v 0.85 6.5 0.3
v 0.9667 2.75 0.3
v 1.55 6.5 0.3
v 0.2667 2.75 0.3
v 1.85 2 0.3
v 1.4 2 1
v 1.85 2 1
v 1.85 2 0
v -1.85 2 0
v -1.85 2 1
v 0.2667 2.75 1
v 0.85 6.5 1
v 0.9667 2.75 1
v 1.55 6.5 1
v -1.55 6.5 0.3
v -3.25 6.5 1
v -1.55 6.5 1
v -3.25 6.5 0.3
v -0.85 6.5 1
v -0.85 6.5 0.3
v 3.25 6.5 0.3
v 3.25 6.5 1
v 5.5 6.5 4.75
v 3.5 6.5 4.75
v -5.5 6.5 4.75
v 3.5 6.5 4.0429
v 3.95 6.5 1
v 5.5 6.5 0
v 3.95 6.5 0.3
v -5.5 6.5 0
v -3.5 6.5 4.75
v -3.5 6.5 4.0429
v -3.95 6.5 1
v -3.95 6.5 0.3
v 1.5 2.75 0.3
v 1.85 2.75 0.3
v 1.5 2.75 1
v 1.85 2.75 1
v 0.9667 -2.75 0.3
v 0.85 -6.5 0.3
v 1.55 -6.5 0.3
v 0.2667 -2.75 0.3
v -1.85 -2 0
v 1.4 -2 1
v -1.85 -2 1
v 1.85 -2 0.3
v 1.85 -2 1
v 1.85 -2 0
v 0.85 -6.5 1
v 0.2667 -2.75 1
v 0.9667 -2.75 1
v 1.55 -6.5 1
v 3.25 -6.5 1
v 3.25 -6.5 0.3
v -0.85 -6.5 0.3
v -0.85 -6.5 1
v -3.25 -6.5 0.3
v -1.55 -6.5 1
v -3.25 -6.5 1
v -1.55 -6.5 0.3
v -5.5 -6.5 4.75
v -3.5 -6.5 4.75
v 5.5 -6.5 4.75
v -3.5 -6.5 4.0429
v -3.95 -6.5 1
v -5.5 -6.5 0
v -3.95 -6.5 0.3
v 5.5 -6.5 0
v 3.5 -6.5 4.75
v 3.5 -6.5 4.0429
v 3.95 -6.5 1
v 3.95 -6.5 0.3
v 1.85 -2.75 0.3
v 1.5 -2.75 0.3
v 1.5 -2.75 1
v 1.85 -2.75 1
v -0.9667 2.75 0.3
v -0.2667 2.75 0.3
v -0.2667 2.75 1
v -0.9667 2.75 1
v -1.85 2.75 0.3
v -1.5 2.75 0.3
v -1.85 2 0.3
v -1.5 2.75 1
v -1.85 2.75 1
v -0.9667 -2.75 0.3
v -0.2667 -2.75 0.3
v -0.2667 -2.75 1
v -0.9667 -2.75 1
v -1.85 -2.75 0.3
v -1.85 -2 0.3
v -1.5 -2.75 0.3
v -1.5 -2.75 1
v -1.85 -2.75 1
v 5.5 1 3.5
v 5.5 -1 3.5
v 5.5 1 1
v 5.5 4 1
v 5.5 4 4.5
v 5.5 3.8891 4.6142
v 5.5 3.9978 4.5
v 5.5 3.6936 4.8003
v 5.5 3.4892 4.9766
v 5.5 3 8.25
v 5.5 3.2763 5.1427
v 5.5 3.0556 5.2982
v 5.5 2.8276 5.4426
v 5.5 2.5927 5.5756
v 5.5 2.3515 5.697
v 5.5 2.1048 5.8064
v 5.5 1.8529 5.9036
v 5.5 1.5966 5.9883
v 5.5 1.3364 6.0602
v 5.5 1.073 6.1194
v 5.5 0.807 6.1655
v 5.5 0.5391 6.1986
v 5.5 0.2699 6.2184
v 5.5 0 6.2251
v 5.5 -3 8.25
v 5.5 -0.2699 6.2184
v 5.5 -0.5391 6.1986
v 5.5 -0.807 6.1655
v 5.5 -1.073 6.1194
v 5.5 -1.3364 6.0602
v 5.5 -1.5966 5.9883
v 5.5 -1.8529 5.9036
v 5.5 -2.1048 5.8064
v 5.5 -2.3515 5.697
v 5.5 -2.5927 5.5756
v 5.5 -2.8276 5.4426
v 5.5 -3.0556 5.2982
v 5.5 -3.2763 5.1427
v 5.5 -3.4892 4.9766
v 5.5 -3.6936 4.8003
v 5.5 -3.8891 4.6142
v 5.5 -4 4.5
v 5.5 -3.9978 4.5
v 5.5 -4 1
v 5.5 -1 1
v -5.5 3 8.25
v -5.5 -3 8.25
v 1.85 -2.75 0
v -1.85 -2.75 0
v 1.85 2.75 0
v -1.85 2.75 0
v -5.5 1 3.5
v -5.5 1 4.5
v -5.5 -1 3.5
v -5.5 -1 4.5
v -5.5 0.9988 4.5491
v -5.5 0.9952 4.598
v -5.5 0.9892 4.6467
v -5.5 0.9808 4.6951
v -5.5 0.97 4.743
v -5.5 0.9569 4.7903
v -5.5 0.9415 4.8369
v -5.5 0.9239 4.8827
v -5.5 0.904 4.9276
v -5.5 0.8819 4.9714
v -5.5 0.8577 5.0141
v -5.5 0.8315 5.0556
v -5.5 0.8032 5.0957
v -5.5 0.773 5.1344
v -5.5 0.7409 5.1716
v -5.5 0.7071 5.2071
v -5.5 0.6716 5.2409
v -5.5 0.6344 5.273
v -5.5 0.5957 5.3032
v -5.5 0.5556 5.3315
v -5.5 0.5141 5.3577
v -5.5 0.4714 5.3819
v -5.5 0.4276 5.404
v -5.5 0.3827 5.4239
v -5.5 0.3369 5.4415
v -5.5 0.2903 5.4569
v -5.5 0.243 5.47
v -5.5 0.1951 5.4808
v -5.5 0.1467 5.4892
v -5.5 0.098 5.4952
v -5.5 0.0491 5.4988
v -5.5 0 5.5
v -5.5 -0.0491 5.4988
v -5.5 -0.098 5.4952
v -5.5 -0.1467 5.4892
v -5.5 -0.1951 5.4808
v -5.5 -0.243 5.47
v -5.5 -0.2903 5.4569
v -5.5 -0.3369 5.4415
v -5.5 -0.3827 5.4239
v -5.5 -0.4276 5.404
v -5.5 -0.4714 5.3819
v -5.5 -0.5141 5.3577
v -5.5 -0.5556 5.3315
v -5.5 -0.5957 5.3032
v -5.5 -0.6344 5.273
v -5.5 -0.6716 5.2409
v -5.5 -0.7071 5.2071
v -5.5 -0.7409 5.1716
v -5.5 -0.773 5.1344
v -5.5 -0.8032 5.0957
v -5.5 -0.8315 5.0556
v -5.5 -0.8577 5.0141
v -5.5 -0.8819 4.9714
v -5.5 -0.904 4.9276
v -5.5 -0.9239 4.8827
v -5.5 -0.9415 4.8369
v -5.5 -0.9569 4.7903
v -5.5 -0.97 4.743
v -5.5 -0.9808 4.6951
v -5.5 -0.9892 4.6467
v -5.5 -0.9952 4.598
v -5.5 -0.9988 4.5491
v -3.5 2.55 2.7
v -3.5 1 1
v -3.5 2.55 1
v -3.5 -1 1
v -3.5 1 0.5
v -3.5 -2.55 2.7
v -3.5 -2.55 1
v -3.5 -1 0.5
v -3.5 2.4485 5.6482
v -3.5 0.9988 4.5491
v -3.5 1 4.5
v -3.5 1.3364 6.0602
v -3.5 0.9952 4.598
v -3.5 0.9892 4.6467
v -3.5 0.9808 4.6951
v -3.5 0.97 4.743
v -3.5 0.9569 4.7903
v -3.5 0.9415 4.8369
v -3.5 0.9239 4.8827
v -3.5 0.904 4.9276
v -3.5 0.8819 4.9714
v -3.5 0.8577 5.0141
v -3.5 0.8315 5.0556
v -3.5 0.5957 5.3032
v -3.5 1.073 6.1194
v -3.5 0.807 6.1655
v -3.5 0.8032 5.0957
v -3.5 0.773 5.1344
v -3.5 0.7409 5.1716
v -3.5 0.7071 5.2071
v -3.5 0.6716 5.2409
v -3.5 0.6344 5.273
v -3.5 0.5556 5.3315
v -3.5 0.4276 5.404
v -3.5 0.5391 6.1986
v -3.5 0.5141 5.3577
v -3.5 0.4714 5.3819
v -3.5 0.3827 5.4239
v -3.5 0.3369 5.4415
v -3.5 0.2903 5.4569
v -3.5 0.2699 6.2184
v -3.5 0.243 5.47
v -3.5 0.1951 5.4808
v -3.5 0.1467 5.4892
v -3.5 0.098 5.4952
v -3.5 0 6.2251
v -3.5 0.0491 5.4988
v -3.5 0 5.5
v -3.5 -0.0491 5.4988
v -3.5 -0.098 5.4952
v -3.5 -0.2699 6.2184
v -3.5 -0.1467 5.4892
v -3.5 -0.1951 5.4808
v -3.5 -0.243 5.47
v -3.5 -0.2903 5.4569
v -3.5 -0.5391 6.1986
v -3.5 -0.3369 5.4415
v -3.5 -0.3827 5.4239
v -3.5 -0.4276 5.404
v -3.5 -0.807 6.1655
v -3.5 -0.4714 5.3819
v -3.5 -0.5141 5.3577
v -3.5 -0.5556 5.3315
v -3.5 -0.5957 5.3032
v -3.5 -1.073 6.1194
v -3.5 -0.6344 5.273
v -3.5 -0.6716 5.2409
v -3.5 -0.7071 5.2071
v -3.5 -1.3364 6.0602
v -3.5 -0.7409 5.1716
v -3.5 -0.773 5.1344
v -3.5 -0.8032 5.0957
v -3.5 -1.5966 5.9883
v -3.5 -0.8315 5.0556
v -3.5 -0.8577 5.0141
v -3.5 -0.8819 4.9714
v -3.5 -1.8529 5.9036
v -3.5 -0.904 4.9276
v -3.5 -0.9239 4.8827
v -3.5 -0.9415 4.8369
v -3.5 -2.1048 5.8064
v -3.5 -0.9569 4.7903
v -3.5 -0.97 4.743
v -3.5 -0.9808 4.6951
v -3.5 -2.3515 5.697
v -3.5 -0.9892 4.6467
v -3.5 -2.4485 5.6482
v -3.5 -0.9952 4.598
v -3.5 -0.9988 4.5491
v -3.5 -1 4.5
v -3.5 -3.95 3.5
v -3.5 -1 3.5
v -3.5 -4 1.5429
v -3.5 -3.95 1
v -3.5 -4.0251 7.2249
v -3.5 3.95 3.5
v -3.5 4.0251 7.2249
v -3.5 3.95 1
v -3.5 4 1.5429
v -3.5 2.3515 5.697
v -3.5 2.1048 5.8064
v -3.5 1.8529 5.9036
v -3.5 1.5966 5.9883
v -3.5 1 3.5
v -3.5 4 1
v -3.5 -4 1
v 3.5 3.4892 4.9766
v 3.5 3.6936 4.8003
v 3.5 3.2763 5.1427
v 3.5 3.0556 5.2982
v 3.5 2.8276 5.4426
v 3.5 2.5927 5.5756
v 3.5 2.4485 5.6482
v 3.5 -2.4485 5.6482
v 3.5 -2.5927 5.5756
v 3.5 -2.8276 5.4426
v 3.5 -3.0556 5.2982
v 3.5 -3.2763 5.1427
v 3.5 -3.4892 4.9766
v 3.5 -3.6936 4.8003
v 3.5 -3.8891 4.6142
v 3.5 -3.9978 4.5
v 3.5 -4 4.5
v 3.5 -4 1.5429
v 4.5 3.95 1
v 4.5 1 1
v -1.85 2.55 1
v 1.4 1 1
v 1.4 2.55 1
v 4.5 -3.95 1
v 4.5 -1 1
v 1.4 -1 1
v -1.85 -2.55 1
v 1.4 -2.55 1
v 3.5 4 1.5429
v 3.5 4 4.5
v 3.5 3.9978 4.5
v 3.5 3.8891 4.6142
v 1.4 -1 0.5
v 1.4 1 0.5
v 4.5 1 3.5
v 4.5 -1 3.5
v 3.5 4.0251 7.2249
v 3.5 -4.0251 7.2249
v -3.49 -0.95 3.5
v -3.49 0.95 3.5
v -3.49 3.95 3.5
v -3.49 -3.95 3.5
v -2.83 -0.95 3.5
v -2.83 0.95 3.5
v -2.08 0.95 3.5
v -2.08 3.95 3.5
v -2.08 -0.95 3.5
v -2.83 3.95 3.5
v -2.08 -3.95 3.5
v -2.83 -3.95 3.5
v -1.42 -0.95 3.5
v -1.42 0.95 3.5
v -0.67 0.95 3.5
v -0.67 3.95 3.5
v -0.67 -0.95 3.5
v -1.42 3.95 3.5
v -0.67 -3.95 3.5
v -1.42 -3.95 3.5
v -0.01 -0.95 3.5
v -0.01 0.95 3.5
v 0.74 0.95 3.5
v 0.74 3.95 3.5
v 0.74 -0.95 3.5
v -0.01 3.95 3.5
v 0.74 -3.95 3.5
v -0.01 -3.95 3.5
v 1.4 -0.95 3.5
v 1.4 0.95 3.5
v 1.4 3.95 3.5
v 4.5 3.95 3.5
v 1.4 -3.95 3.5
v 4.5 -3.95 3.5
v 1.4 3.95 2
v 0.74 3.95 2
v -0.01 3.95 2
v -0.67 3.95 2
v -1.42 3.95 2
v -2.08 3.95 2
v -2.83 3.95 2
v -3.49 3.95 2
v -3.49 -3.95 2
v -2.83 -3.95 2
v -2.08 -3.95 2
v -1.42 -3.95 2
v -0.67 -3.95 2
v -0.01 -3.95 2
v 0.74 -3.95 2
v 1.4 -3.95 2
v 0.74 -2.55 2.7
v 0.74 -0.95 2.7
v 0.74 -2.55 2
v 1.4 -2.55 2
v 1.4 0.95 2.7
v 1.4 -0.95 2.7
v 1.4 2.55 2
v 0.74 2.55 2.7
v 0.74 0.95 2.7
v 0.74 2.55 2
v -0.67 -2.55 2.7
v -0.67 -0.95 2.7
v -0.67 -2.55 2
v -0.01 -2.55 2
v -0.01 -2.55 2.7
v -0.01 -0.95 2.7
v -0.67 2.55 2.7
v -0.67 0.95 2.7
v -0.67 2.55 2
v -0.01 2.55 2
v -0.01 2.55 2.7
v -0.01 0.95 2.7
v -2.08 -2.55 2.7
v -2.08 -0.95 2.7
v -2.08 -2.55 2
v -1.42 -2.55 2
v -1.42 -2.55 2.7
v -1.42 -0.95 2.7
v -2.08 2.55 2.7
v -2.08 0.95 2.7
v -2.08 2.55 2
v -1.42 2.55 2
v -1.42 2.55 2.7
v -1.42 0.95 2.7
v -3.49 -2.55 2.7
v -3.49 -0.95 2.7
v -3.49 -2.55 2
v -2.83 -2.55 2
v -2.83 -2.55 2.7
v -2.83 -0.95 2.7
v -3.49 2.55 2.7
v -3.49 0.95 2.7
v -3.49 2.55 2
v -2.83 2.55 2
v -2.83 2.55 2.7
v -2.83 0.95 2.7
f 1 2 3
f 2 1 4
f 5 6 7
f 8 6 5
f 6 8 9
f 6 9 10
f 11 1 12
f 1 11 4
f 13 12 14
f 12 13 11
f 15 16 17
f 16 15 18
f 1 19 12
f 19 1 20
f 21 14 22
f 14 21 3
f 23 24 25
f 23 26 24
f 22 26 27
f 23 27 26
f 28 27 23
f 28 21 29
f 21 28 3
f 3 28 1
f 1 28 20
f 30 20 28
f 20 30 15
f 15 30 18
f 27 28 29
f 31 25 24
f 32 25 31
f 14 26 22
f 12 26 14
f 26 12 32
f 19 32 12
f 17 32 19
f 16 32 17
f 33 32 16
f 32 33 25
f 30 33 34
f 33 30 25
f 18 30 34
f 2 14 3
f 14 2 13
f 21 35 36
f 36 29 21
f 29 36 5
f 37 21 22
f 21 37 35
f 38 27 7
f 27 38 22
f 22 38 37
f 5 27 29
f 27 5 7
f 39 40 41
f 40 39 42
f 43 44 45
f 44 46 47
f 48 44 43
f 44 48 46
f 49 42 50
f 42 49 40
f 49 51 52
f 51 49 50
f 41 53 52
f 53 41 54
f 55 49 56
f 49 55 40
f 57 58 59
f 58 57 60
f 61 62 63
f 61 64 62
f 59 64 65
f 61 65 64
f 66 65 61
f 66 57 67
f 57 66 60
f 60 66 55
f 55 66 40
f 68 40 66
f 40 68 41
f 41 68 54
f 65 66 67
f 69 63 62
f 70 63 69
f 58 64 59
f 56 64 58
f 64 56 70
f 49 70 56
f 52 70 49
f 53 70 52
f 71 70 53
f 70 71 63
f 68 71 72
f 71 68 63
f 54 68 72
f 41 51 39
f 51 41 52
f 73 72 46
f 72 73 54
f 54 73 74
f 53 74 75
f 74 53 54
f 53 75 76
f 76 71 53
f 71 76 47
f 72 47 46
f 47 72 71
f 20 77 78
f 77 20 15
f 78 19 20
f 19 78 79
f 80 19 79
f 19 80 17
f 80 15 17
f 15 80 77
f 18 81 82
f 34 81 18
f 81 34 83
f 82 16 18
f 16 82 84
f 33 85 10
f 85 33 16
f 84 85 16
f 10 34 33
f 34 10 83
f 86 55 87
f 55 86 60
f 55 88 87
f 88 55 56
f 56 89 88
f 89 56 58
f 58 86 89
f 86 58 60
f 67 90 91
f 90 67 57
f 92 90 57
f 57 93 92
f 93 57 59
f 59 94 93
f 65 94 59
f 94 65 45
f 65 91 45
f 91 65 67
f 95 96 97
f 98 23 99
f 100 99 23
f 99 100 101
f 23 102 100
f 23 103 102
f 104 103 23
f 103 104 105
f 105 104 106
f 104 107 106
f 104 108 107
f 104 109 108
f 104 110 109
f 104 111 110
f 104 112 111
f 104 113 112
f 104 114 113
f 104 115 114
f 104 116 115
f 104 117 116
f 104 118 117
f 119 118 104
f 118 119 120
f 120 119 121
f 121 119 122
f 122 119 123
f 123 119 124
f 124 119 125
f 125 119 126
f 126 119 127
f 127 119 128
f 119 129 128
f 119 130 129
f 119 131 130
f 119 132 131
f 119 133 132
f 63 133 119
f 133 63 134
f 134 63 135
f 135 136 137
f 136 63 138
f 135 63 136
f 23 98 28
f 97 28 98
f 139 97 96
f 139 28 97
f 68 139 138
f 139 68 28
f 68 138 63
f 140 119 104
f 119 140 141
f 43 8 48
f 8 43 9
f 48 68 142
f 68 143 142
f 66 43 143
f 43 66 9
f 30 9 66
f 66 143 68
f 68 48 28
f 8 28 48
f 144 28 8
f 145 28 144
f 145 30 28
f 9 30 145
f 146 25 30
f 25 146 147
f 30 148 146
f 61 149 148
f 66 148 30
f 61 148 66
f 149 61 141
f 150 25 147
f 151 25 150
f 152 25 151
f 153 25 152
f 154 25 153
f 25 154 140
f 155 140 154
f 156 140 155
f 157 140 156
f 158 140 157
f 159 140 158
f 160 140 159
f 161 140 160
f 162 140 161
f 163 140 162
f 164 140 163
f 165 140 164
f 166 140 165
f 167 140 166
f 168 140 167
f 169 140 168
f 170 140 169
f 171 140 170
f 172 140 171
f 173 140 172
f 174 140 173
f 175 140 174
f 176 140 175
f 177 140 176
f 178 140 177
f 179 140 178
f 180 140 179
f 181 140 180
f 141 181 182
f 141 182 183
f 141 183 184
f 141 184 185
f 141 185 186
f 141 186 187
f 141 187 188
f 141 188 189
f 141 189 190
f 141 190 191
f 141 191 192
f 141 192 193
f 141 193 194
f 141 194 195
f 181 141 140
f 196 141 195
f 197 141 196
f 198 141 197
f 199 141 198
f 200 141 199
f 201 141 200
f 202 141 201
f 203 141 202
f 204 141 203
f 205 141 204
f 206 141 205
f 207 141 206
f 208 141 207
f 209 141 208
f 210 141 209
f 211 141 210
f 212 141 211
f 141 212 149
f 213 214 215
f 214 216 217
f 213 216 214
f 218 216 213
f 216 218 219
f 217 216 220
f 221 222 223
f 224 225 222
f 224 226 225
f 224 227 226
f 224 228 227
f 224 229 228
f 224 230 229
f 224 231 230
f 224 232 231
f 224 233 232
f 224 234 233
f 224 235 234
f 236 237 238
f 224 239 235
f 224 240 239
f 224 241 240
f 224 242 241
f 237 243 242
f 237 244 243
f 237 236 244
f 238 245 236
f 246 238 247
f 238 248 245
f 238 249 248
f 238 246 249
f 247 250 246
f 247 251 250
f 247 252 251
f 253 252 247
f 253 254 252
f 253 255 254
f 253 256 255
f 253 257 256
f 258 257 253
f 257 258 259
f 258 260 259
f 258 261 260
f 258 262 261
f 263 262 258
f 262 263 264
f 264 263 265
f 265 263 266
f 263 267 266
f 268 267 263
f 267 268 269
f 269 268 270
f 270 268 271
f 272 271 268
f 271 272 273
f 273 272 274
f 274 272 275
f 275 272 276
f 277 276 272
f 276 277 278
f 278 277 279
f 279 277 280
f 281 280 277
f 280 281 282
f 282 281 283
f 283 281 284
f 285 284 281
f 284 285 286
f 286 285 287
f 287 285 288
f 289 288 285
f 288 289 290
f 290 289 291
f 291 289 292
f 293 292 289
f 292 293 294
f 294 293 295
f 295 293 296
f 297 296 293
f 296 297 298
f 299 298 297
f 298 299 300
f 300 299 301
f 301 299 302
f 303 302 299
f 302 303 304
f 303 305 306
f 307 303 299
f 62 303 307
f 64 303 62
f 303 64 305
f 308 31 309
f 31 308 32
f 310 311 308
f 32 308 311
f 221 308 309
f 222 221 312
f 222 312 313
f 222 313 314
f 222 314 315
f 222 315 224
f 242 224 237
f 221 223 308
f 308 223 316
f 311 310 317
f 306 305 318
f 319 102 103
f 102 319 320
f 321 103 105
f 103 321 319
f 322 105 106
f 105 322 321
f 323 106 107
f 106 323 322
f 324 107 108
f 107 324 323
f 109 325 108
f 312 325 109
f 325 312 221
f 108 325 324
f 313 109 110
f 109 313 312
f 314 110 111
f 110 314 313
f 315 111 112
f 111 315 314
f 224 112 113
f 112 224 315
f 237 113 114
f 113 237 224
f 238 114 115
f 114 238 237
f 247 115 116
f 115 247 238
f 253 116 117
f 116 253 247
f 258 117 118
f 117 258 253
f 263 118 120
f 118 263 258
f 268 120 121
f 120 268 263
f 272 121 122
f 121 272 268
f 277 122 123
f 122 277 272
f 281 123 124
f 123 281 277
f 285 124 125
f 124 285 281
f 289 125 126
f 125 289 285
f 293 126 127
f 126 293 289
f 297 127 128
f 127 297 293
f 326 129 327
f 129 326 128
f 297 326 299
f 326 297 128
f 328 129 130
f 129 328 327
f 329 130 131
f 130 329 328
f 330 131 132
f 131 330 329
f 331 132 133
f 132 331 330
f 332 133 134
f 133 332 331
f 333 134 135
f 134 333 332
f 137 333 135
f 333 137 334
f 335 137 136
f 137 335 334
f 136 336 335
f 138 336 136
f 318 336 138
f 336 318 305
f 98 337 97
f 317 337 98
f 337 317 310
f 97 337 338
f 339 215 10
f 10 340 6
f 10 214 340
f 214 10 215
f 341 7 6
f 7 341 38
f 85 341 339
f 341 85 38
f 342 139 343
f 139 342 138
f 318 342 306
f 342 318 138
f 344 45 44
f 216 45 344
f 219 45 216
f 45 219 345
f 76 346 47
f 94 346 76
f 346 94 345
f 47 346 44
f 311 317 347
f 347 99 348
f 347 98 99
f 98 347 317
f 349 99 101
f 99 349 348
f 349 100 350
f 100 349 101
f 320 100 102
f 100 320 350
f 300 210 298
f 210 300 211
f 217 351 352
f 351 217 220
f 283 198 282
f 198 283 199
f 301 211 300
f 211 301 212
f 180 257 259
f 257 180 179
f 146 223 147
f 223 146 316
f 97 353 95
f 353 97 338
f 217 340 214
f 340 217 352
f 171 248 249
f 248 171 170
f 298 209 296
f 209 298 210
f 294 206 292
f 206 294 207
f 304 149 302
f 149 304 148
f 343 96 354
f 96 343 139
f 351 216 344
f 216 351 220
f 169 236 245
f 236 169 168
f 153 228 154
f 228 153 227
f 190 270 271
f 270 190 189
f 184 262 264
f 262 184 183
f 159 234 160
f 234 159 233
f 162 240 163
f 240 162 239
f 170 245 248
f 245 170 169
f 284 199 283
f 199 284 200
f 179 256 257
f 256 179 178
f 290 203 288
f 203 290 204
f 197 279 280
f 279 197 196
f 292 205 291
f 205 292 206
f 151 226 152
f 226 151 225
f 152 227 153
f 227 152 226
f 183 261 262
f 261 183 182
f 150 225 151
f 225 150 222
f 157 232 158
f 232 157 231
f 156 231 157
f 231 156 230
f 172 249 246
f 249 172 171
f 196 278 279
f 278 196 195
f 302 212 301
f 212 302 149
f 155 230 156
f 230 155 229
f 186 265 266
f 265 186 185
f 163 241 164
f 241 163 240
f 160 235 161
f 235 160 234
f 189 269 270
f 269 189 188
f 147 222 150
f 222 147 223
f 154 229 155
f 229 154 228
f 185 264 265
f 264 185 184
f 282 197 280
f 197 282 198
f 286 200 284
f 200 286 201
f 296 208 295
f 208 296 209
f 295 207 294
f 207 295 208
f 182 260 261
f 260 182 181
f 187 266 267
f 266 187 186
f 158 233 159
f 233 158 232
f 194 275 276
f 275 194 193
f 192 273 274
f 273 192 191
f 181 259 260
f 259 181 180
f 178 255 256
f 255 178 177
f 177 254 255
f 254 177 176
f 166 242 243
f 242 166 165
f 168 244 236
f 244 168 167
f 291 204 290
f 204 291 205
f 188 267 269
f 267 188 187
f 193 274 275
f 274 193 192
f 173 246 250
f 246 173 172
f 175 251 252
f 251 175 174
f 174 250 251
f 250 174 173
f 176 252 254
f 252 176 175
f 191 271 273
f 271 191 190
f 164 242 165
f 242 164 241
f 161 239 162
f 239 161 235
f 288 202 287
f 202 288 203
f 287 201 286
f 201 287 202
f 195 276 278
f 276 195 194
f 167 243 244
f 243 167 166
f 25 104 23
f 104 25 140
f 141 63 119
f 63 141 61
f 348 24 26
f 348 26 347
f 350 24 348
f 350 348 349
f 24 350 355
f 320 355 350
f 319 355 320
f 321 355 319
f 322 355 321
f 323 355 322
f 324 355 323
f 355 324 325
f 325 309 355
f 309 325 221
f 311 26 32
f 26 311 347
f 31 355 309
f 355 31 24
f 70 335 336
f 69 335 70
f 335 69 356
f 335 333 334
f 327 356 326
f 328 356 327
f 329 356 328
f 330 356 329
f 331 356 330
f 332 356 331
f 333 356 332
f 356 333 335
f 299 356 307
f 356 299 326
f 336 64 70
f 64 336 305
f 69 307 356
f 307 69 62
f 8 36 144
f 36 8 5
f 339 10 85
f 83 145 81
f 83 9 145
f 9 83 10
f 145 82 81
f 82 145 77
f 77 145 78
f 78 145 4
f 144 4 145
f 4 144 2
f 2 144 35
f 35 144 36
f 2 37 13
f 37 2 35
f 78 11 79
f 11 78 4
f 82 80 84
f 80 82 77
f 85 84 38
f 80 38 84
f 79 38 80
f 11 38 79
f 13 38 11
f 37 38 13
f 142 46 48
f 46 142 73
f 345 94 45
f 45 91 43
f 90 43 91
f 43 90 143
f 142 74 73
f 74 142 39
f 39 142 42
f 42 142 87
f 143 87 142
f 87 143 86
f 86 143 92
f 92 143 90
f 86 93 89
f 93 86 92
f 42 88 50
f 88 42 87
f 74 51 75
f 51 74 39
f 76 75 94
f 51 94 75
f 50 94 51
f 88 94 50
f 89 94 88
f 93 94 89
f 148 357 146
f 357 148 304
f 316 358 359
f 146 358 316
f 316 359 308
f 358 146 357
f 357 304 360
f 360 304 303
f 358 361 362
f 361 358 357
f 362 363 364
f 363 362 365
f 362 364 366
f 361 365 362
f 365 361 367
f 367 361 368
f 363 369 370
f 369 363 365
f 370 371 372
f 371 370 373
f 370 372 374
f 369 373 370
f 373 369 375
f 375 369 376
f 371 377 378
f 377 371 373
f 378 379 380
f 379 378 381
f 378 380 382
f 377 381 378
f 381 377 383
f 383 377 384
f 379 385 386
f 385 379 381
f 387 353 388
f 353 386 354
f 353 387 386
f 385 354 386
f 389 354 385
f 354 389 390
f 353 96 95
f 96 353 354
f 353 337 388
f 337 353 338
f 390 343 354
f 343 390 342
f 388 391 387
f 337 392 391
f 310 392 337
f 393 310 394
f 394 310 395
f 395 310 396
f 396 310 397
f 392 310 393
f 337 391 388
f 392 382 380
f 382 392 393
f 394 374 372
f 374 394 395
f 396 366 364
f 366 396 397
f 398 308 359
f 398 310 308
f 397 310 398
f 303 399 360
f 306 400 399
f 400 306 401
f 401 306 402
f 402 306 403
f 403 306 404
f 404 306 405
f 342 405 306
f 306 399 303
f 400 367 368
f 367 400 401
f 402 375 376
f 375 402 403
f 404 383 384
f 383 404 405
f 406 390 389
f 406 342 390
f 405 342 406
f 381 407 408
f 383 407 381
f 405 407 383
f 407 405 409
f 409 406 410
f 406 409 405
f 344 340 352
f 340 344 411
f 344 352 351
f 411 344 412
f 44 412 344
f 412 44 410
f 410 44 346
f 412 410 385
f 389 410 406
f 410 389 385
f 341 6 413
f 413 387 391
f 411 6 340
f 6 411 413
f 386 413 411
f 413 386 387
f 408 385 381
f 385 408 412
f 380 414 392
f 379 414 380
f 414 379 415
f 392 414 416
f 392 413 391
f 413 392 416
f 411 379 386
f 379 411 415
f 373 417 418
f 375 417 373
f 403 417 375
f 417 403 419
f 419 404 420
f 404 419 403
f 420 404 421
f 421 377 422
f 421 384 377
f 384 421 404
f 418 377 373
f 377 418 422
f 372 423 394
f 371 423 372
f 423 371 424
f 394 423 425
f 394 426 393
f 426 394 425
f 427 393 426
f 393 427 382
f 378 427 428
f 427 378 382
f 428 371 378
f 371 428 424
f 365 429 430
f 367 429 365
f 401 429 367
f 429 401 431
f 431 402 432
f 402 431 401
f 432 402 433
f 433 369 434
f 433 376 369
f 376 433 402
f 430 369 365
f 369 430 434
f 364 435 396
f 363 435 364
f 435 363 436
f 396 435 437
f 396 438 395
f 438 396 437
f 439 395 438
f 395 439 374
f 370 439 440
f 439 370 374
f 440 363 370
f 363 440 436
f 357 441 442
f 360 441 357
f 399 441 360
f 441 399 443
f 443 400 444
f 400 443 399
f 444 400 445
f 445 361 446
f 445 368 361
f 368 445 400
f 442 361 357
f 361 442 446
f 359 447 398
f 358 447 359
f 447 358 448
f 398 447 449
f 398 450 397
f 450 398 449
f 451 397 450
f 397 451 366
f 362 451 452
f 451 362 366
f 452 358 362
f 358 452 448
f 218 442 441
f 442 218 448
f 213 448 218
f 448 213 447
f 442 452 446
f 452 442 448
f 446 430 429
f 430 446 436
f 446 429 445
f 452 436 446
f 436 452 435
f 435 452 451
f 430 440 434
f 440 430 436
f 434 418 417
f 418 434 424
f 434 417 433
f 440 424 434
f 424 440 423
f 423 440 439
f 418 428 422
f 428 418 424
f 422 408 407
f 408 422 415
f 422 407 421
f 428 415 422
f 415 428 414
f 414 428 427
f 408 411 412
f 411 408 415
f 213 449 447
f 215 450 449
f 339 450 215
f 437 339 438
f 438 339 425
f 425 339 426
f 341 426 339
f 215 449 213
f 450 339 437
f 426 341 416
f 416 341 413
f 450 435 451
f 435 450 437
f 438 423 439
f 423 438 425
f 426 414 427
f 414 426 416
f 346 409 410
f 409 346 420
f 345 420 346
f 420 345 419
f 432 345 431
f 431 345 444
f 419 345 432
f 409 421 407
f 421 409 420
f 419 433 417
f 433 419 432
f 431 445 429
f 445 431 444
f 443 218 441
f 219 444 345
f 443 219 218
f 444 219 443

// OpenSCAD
/**
 * @file ambb_v2.scad
 * @brief This file contains the code for an improved AMBB (Additive Manufacture Breakout Board).
 * @author Cameron K. Brooks
 * @details The AMBB is a project that aims to create a 3D printable enclosure to demonstrate the concept
 *          of a breakout board that's 3D printable. It works by enforcing contact between an SMT (in this
 *          study, an 8-SOIC form) and header pins to create a through-hole component that's compatible with
 *          a breadboard. The AMBB is designed to be 3D printed and assembled in three parts.
 * @version 2.0
 * @copyright Jan 2025
 */

// -------------------------------
// Global parameters
// -------------------------------
$fn = $preview ? 64 : 128;
zFite = $preview ? 0.1 : 0;

// -------------------------------
// Enclosure parameters
// -------------------------------
enclosure_color = "DarkGreen";
enclosure_opacity = 1.0;

// base parameters
base_length = 11.00;
base_width = 13.00;
base_height = 8.25;

// slot/main cavity parameters
arc_rad = 5.5;
slot_wall_height = 3.5;
slot_width = 8;
slot_length = 9;
floor_thickness = 1.0;

// track parameters
track_width = 2;
track_height = 4;
track_depth = 0.50;
track_arc_rad = 1;

// channel parameters
chan_entry_midp_sep = 2.4;
chan_terminal_midp_sep = 1.0;
chan_group_midp_sep = 2.0;
chan_length_proj = base_width / 2 - chan_group_midp_sep + zFite;
chan_entry_width = 0.7;
chan_terminal_width = 0.7;
chan_entry_height = 0.7 + zFite;
chan_terminal_height = 0.7 + zFite;

// channel end gap parameters
chan_terminal_end_gap_width = 0.75;
chan_terminal_eng_gap_length = chan_terminal_width + chan_terminal_midp_sep * 3;
offset1 = 0;

// chamfer dimension parameter
chamfer_dim = 3.5;

// PA = pin access
PA_front_offset = 2.0;
PA_hypot = 4.0;
PA_length = slot_length - PA_front_offset;
PA_depth = 4.5;
PA_hypot_offset = -0.5;

// -------------------------------
// Component housing parameters
// -------------------------------

// CH = component housing | PA = pin access
CH_color = "MediumOrchid";
CH_opacity = 1.0; // 0 is fully transparent and 1 is fully opaque

// component housing parameters
CH_height = 2.5;
CH_slot_width = 5.1;
CH_slot_length = 4.9;
CH_slot_depth = 1.7;
CH_slot_front_offset = 1.0;

// pin access slot parameters
CH_PA_width = 0.66;
CH_PA_height = 1.5;
CH_PA_length = 3.0;
CH_PA_sep = 0.75;

// ---------------------------------------------------------------------------------------
// Derived parameters for the enclosure - channels where the header pins will be inserted
// ---------------------------------------------------------------------------------------

// channel points for the inner channel
ChannelPointsInner =
    [[chan_terminal_midp_sep * 0.5 - chan_terminal_width / 2, chan_group_midp_sep, offset1],                        // 0
     [chan_terminal_midp_sep * 0.5 + chan_terminal_width / 2, chan_group_midp_sep, offset1],                        // 1
     [chan_entry_midp_sep * 0.5 - chan_entry_width / 2, chan_group_midp_sep + chan_length_proj, offset1],           // 2
     [chan_entry_midp_sep * 0.5 + chan_entry_width / 2, chan_group_midp_sep + chan_length_proj, offset1],           // 3
     [chan_terminal_midp_sep * 0.5 - chan_terminal_width / 2, chan_group_midp_sep, offset1 + chan_terminal_height], // 4
     [chan_terminal_midp_sep * 0.5 + chan_terminal_width / 2, chan_group_midp_sep, offset1 + chan_terminal_height], // 5
     [chan_entry_midp_sep * 0.5 - chan_entry_width / 2, chan_group_midp_sep + chan_length_proj,
      offset1 + chan_entry_height], // 6
     [chan_entry_midp_sep * 0.5 + chan_entry_width / 2, chan_group_midp_sep + chan_length_proj,
      offset1 + chan_entry_height]]; // 7

// channel points for the outer channel
ChannelPointsOuter =
    [[chan_terminal_midp_sep * 1.5 - chan_terminal_width / 2, chan_group_midp_sep, offset1],                        // 0
     [chan_terminal_midp_sep * 1.5 + chan_terminal_width / 2, chan_group_midp_sep, offset1],                        // 1
     [chan_entry_midp_sep * 1.5 - chan_entry_width / 2, chan_group_midp_sep + chan_length_proj, offset1],           // 2
     [chan_entry_midp_sep * 1.5 + chan_entry_width / 2, chan_group_midp_sep + chan_length_proj, offset1],           // 3
     [chan_terminal_midp_sep * 1.5 - chan_terminal_width / 2, chan_group_midp_sep, offset1 + chan_terminal_height], // 4
     [chan_terminal_midp_sep * 1.5 + chan_terminal_width / 2, chan_group_midp_sep, offset1 + chan_terminal_height], // 5
     [chan_entry_midp_sep * 1.5 - chan_entry_width / 2, chan_group_midp_sep + chan_length_proj,
      offset1 + chan_entry_height], // 6
     [chan_entry_midp_sep * 1.5 + chan_entry_width / 2, chan_group_midp_sep + chan_length_proj,
      offset1 + chan_entry_height]]; // 7

// channel faces
ChannelFaces = [
    [ 2, 0, 1, 3 ], // bottom
    [ 5, 1, 0, 4 ], // front
    [ 5, 4, 6, 7 ], // top
    [ 6, 4, 0, 2 ], // right
    [ 2, 3, 7, 6 ], // back
    [ 5, 7, 3, 1 ], // left
];

// -------------------------------
// Render control
// -------------------------------

render_enclosure = true;
render_component_housing = true;
render_bolt = true;

// -------------------------------
// ENCLOSURE
// -------------------------------
color(enclosure_color, enclosure_opacity) if (render_enclosure)
{

    translate([ -base_length / 2, 0, 0 ]) difference()
    {
        // main cube
        translate([ base_length / 2, 0, base_height / 2 ]) cube([ base_length, base_width, base_height ], true);

        // cube - slot
        translate([ base_length - slot_length, 0, slot_wall_height + floor_thickness ]) rotate(90, [ 0, 1, 0 ])
            linear_extrude(height = slot_length + zFite) union()
        {
            difference()
            {
                translate([ sqrt(arc_rad ^ 2 - (slot_width / 2) ^ 2), 0, 0 ]) circle(arc_rad);
                translate([ -1 * 0 * sqrt(arc_rad ^ 2 - (slot_width / 2) ^ 2), -arc_rad, 0 ])
                    square([ arc_rad * 2, arc_rad * 2 ]);
            }
            translate([ -1 * 0 * sqrt(arc_rad ^ 2 - (slot_width / 2) ^ 2) + slot_wall_height / 2, 0, 0 ])
                square([ slot_wall_height, slot_width ], center = true);
        }

        // cube - slot - track
        translate([ base_length + zFite / 2, 0, track_height / 2 + floor_thickness - track_depth ])
            rotate(-90, [ 0, 1, 0 ]) linear_extrude(height = base_length + zFite) union()
        {
            square([ track_height, track_width ], true);
            translate([ track_height / 2, 0, 0 ]) circle(track_arc_rad);
        }

        // cube - slot - track - channels
        translate([ base_length / 2, 0, floor_thickness - chan_terminal_height + zFite / 2 ]) union()
        {
            union()
            {
                polyhedron(ChannelPointsInner,
                           ChannelFaces); // channel adjacent to centerline
                polyhedron(ChannelPointsOuter,
                           ChannelFaces); // channel outside of above channel
            }
            mirror([ 0, 1, 0 ]) union()
            {
                polyhedron(ChannelPointsInner,
                           ChannelFaces); // channel adjacent to centerline
                polyhedron(ChannelPointsOuter,
                           ChannelFaces); // channel outside of above channel
            }
            mirror([ 1, 0, 0 ]) union()
            {
                polyhedron(ChannelPointsInner,
                           ChannelFaces); // channel adjacent to centerline
                polyhedron(ChannelPointsOuter,
                           ChannelFaces); // channel outside of above channel
            }
            mirror([ 0, 1, 0 ]) mirror([ 1, 0, 0 ]) union()
            {
                polyhedron(ChannelPointsInner,
                           ChannelFaces); // channel adjacent to centerline
                polyhedron(ChannelPointsOuter,
                           ChannelFaces); // channel outside of above channel
            }
        }

        // cube - slot - track - channels - bolt hole - threading - chamfer
        translate([ -zFite / 2, base_width / 2 + zFite, base_height - chamfer_dim ]) rotate(45, [ 1, 0, 0 ])
            cube([ base_length + zFite, (chamfer_dim / 2) / sin(45) + zFite, chamfer_dim / sin(45) + zFite ]);
        mirror([ 0, 1, 0 ]) translate([ -zFite / 2, base_width / 2 + zFite, base_height - chamfer_dim ])
            rotate(45, [ 1, 0, 0 ])
                cube([ base_length + zFite, (chamfer_dim / 2) / sin(45) + zFite, chamfer_dim / sin(45) + zFite ]);

        // cube - slot - track - channels - bolt hole - threading - pin access
        translate([ base_length - PA_length - PA_front_offset, base_width / 2 + zFite, base_height - chamfer_dim ])
            rotate(45, [ 1, 0, 0 ]) translate([ 0, -PA_depth + zFite, PA_hypot_offset ])
                cube([ PA_length, PA_depth, PA_hypot ]);
        mirror([ 0, 1, 0 ])
            translate([ base_length - PA_length - PA_front_offset, base_width / 2 + zFite, base_height - chamfer_dim ])
                rotate(45, [ 1, 0, 0 ]) translate([ 0, -PA_depth + zFite, PA_hypot_offset ])
                    cube([ PA_length, PA_depth, PA_hypot ]);

        translate([ base_length / 2 - chan_terminal_eng_gap_length / 2, chan_group_midp_sep, -zFite / 2 ])
            cube([ chan_terminal_eng_gap_length, chan_terminal_end_gap_width, floor_thickness + zFite ]);
        mirror([ 0, 1, 0 ])
            translate([ base_length / 2 - chan_terminal_eng_gap_length / 2, chan_group_midp_sep, -zFite / 2 ])
                cube([ chan_terminal_eng_gap_length, chan_terminal_end_gap_width, floor_thickness + zFite ]);
    }
}

// -------------------------------
// COMPONENT HOUSING
// -------------------------------
translate([ 0, 0, CH_height + floor_thickness ]) rotate([ 0, 180, 0 ])
    color(CH_color, CH_opacity) if (render_component_housing)
{
    difference()
    {
        translate([ 0, 0, CH_height / 2 ]) union()
        {
            // base cube
            cube([ slot_length, slot_width - 0.1, CH_height ], true);
            // track
            translate([ 0, 0, track_depth / 2 ]) cube([ base_length, track_width, CH_height + track_depth ], true);
        }
        // IC cavity
        translate([
            slot_length / 2 - CH_slot_length / 2 - CH_slot_front_offset, 0,
            CH_height + track_depth / 2 - CH_slot_depth / 2
        ]) cube([ CH_slot_length, CH_slot_width, CH_slot_depth + track_depth + zFite ], true);

        // pin access slots
        translate([ 0, 0, 0 ])
        {
            // Create cubes for the mirrored set
            for (i = [0:3])
            {
                for (j = [0:1])
                {
                    mirror([ 0, j, 0 ]) translate([
                        CH_PA_width * (i + 0.5) + CH_PA_sep * i - CH_slot_length + slot_length / 2 -
                            CH_slot_front_offset,
                        CH_PA_length / 2 - (slot_width - 0.1) / 2, CH_PA_height / 2
                    ])
                    {
                        cube([ CH_PA_width, CH_PA_length + zFite, CH_PA_height + zFite ], true);
                    }
                }
            }
        }
    }
}
